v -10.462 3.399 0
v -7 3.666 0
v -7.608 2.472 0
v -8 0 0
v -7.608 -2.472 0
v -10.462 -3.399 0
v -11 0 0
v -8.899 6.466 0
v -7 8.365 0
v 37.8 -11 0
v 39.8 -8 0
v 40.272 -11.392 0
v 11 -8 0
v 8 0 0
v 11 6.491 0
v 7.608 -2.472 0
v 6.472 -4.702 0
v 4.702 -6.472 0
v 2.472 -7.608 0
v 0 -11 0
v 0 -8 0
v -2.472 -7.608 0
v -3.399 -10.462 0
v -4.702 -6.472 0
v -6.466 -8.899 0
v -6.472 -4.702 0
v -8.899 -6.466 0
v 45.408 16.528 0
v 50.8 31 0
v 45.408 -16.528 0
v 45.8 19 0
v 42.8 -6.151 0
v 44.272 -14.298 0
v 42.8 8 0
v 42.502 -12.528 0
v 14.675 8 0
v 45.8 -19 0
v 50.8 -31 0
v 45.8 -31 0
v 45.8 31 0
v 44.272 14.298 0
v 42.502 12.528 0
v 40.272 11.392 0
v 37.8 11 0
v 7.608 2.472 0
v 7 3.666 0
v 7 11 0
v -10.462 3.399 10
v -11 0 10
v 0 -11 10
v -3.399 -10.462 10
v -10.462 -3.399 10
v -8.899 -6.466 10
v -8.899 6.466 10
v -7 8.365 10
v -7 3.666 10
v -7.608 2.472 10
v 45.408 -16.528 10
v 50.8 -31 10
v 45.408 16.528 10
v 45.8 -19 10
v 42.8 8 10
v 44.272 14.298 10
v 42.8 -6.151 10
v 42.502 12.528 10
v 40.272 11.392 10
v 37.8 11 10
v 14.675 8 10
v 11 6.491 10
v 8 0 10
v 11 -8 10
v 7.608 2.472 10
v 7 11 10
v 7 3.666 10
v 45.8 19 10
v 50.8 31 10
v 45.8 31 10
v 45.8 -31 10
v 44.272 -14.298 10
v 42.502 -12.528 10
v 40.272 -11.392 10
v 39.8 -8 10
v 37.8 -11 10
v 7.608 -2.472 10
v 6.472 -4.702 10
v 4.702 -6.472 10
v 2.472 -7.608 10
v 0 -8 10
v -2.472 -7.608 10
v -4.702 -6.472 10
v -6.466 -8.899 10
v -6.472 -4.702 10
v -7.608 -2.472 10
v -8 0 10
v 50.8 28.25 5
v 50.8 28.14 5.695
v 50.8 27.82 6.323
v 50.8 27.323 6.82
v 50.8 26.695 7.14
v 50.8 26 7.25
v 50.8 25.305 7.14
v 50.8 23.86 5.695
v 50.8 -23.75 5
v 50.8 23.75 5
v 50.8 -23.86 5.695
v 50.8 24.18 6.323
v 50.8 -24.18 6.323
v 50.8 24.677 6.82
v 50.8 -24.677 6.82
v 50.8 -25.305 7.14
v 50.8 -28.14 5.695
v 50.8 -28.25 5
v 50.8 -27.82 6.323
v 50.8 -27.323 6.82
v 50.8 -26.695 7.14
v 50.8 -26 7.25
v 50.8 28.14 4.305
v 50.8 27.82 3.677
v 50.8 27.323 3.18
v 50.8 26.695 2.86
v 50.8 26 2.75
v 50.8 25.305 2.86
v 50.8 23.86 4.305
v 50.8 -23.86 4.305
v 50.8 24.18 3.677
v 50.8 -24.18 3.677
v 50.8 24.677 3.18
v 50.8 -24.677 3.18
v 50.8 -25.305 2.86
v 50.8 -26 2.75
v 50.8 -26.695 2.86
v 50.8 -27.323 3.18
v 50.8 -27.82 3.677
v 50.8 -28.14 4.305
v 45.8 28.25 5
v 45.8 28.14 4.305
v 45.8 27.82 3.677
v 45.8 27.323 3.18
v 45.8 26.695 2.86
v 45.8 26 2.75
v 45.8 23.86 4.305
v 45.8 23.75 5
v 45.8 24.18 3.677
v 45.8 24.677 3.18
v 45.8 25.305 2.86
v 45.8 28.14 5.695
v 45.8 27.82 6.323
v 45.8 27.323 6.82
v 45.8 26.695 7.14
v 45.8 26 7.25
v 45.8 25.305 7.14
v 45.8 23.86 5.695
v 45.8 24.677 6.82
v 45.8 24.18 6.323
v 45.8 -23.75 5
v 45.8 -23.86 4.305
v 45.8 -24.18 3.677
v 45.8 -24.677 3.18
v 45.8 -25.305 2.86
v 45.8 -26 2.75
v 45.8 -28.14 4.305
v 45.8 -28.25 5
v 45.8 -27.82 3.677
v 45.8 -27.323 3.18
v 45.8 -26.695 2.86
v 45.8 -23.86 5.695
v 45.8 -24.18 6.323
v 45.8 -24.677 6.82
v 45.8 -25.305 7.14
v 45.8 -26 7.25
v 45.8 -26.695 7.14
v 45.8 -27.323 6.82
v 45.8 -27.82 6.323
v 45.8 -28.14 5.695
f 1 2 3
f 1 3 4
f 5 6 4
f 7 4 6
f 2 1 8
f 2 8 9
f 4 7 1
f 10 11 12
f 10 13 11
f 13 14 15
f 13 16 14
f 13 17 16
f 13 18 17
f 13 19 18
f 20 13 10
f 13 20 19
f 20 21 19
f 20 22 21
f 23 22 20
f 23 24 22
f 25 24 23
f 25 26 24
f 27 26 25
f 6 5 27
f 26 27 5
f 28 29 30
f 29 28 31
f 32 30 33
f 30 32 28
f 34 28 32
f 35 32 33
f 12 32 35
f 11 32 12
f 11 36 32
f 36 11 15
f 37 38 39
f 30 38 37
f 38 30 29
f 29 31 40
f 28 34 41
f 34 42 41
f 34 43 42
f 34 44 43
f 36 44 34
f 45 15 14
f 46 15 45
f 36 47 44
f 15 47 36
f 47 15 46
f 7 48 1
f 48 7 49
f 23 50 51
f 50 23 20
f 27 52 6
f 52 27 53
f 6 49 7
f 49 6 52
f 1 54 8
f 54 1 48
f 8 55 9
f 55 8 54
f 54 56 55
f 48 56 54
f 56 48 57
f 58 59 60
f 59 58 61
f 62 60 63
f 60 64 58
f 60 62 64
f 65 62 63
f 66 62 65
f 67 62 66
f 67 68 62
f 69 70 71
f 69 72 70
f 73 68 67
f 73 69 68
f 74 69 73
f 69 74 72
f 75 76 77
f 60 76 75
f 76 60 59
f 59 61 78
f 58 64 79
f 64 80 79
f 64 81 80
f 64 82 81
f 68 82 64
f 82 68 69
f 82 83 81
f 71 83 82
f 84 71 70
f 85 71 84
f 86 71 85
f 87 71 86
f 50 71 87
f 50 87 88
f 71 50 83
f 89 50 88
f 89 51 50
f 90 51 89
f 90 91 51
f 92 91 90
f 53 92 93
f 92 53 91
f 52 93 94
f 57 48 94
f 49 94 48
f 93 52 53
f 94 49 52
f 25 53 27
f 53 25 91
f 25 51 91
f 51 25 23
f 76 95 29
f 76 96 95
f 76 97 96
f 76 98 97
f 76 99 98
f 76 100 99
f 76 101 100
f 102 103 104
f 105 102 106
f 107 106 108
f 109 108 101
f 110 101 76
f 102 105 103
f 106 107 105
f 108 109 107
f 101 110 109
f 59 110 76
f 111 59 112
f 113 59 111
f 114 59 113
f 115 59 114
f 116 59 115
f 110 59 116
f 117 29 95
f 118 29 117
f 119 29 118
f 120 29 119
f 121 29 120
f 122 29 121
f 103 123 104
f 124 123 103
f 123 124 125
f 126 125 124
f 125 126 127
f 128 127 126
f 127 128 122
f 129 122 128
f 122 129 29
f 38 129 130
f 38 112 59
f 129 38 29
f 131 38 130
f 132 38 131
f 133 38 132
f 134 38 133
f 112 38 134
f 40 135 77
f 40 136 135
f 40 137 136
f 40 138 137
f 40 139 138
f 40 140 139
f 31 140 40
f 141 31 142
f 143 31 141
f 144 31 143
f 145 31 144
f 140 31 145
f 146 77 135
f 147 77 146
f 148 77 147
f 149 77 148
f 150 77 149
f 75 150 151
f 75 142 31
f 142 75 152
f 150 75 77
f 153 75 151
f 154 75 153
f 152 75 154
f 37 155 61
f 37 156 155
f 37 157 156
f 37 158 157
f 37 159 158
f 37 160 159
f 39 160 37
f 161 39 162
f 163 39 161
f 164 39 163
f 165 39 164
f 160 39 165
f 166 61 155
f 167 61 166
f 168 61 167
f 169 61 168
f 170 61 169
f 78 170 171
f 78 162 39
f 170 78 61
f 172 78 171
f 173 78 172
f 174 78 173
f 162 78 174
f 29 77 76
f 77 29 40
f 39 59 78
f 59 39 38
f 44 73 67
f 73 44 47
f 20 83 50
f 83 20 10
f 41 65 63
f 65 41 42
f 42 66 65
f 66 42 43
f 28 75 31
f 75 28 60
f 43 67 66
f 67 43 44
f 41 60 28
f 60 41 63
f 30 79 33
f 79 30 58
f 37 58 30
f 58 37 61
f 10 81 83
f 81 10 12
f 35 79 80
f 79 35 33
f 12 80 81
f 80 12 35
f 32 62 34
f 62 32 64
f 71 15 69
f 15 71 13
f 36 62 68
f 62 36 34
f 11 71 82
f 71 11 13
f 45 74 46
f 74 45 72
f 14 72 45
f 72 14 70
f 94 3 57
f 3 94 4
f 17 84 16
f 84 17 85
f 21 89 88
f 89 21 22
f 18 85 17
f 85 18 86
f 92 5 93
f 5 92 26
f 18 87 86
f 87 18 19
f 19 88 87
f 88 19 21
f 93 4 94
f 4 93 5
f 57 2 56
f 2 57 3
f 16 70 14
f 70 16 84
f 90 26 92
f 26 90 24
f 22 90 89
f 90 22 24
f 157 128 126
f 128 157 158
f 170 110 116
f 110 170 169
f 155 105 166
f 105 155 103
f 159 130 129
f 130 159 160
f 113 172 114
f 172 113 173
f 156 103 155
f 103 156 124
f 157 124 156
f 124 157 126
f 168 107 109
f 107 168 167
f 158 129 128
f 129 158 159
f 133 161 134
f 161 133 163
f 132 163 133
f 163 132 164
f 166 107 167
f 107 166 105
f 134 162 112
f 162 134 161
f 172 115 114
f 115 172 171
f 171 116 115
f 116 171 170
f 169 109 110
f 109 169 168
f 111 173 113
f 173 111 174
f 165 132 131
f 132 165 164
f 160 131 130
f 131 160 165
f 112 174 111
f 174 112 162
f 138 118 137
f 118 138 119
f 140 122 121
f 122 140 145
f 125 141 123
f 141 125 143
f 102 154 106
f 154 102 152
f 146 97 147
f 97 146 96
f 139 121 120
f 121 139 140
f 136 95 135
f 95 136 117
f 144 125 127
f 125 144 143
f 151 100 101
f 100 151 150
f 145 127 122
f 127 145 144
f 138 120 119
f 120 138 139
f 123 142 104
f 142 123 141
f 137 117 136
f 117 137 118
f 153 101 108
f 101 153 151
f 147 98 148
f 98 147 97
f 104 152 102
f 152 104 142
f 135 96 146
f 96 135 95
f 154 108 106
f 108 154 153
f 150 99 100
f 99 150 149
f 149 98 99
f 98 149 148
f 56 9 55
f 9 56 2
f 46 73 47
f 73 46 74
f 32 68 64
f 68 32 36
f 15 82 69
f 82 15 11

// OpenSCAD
// Pipe hanger 
//John Finch 2-6-14


//User Inputs
inner_dia=16; 		//large inner hole
wall=3;  			//wall thickness of loop
tab_length=20; 		//mounting tab length
tab_thickness=5;		//mounting tab thickness
clip_width=10; 		//height of loop along Z axis
mount_hole_dia=4.5;	//screw hole diameter
opening=1;			//1 for a gap in loop, 0 for a solid loop
opening_width=14;	//opening width if enabled
center_to_wall_dist = 50.8; //Distance from center of support to wall
fillet_radius = 8;  //radius of fillet where support meets wall tabs


//end of user inputs
lightening_length = center_to_wall_dist - inner_dia/2-2*wall-tab_thickness;
lightening_width = inner_dia;
lightening_angle = atan(lightening_width/lightening_length);
cross_length = sqrt(lightening_length*lightening_length+lightening_width*lightening_width);

fn=20;


difference(){

	union(){
  	//place outer ring
	cylinder(h=clip_width,r1=inner_dia/2+wall,r2=inner_dia/2+wall,$fn=fn);

	//place mounting tabs
	translate([center_to_wall_dist-tab_thickness,-(inner_dia+2*wall+2*tab_length)/2,0])
	cube([tab_thickness,inner_dia+2*wall+2*tab_length,clip_width]);

	//place lower cube
	translate([0,-inner_dia/2-wall,0])
	cube([center_to_wall_dist,inner_dia+2*wall,clip_width]);

	//Place fillet cubes
	translate ([center_to_wall_dist-tab_thickness-fillet_radius,inner_dia/2+wall,0])
	cube([fillet_radius,fillet_radius,clip_width]);
	
	translate ([center_to_wall_dist-tab_thickness-fillet_radius,-inner_dia/2-wall-fillet_radius,0])
	cube([fillet_radius,fillet_radius,clip_width]);

	}

//cut fillet radai
translate ([center_to_wall_dist-tab_thickness-fillet_radius,inner_dia/2+wall+fillet_radius,0])
cylinder(h=clip_width,r1=fillet_radius, r2=fillet_radius,$fn=fn);

translate ([center_to_wall_dist-tab_thickness-fillet_radius,-inner_dia/2-wall-fillet_radius,0])
cylinder(h=clip_width,r1=fillet_radius, r2=fillet_radius,$fn=fn);

//Cut major lighting rectangle
translate([inner_dia/2+wall,-inner_dia/2,0])

cube([center_to_wall_dist - inner_dia/2-2*wall-tab_thickness,inner_dia,clip_width]);


//cut inner hole
cylinder(h=clip_width,r1=inner_dia/2,r2=inner_dia/2,$fn=fn);

//cut hole in mounting tab 1
translate([center_to_wall_dist-tab_thickness*1.01,-(inner_dia/2+wall+tab_length*3/4),clip_width/2])
rotate([0,90,0])
cylinder(h=tab_thickness*1.05,r1=mount_hole_dia/2,r2=mount_hole_dia/2,$fn=fn);

//cut hole in mounting tab 2
translate([center_to_wall_dist-tab_thickness*1.01,(inner_dia/2+wall+tab_length*3/4),clip_width/2])
rotate([0,90,0])
cylinder(h=tab_thickness*1.05,r1=mount_hole_dia/2,r2=mount_hole_dia/2,$fn=fn);

//slice ring
rotate([0,0,-90])
if (opening == 1)
	{
	translate([-(inner_dia/2+wall),-opening_width/2,0])
	cube([inner_dia/2,opening_width,clip_width]);
	}
}

//add strengthening bars to lightning hole
translate([inner_dia/2,inner_dia/2,0])
rotate([0,0,-lightening_angle])
cube([cross_length+2*wall,wall,clip_width]);
